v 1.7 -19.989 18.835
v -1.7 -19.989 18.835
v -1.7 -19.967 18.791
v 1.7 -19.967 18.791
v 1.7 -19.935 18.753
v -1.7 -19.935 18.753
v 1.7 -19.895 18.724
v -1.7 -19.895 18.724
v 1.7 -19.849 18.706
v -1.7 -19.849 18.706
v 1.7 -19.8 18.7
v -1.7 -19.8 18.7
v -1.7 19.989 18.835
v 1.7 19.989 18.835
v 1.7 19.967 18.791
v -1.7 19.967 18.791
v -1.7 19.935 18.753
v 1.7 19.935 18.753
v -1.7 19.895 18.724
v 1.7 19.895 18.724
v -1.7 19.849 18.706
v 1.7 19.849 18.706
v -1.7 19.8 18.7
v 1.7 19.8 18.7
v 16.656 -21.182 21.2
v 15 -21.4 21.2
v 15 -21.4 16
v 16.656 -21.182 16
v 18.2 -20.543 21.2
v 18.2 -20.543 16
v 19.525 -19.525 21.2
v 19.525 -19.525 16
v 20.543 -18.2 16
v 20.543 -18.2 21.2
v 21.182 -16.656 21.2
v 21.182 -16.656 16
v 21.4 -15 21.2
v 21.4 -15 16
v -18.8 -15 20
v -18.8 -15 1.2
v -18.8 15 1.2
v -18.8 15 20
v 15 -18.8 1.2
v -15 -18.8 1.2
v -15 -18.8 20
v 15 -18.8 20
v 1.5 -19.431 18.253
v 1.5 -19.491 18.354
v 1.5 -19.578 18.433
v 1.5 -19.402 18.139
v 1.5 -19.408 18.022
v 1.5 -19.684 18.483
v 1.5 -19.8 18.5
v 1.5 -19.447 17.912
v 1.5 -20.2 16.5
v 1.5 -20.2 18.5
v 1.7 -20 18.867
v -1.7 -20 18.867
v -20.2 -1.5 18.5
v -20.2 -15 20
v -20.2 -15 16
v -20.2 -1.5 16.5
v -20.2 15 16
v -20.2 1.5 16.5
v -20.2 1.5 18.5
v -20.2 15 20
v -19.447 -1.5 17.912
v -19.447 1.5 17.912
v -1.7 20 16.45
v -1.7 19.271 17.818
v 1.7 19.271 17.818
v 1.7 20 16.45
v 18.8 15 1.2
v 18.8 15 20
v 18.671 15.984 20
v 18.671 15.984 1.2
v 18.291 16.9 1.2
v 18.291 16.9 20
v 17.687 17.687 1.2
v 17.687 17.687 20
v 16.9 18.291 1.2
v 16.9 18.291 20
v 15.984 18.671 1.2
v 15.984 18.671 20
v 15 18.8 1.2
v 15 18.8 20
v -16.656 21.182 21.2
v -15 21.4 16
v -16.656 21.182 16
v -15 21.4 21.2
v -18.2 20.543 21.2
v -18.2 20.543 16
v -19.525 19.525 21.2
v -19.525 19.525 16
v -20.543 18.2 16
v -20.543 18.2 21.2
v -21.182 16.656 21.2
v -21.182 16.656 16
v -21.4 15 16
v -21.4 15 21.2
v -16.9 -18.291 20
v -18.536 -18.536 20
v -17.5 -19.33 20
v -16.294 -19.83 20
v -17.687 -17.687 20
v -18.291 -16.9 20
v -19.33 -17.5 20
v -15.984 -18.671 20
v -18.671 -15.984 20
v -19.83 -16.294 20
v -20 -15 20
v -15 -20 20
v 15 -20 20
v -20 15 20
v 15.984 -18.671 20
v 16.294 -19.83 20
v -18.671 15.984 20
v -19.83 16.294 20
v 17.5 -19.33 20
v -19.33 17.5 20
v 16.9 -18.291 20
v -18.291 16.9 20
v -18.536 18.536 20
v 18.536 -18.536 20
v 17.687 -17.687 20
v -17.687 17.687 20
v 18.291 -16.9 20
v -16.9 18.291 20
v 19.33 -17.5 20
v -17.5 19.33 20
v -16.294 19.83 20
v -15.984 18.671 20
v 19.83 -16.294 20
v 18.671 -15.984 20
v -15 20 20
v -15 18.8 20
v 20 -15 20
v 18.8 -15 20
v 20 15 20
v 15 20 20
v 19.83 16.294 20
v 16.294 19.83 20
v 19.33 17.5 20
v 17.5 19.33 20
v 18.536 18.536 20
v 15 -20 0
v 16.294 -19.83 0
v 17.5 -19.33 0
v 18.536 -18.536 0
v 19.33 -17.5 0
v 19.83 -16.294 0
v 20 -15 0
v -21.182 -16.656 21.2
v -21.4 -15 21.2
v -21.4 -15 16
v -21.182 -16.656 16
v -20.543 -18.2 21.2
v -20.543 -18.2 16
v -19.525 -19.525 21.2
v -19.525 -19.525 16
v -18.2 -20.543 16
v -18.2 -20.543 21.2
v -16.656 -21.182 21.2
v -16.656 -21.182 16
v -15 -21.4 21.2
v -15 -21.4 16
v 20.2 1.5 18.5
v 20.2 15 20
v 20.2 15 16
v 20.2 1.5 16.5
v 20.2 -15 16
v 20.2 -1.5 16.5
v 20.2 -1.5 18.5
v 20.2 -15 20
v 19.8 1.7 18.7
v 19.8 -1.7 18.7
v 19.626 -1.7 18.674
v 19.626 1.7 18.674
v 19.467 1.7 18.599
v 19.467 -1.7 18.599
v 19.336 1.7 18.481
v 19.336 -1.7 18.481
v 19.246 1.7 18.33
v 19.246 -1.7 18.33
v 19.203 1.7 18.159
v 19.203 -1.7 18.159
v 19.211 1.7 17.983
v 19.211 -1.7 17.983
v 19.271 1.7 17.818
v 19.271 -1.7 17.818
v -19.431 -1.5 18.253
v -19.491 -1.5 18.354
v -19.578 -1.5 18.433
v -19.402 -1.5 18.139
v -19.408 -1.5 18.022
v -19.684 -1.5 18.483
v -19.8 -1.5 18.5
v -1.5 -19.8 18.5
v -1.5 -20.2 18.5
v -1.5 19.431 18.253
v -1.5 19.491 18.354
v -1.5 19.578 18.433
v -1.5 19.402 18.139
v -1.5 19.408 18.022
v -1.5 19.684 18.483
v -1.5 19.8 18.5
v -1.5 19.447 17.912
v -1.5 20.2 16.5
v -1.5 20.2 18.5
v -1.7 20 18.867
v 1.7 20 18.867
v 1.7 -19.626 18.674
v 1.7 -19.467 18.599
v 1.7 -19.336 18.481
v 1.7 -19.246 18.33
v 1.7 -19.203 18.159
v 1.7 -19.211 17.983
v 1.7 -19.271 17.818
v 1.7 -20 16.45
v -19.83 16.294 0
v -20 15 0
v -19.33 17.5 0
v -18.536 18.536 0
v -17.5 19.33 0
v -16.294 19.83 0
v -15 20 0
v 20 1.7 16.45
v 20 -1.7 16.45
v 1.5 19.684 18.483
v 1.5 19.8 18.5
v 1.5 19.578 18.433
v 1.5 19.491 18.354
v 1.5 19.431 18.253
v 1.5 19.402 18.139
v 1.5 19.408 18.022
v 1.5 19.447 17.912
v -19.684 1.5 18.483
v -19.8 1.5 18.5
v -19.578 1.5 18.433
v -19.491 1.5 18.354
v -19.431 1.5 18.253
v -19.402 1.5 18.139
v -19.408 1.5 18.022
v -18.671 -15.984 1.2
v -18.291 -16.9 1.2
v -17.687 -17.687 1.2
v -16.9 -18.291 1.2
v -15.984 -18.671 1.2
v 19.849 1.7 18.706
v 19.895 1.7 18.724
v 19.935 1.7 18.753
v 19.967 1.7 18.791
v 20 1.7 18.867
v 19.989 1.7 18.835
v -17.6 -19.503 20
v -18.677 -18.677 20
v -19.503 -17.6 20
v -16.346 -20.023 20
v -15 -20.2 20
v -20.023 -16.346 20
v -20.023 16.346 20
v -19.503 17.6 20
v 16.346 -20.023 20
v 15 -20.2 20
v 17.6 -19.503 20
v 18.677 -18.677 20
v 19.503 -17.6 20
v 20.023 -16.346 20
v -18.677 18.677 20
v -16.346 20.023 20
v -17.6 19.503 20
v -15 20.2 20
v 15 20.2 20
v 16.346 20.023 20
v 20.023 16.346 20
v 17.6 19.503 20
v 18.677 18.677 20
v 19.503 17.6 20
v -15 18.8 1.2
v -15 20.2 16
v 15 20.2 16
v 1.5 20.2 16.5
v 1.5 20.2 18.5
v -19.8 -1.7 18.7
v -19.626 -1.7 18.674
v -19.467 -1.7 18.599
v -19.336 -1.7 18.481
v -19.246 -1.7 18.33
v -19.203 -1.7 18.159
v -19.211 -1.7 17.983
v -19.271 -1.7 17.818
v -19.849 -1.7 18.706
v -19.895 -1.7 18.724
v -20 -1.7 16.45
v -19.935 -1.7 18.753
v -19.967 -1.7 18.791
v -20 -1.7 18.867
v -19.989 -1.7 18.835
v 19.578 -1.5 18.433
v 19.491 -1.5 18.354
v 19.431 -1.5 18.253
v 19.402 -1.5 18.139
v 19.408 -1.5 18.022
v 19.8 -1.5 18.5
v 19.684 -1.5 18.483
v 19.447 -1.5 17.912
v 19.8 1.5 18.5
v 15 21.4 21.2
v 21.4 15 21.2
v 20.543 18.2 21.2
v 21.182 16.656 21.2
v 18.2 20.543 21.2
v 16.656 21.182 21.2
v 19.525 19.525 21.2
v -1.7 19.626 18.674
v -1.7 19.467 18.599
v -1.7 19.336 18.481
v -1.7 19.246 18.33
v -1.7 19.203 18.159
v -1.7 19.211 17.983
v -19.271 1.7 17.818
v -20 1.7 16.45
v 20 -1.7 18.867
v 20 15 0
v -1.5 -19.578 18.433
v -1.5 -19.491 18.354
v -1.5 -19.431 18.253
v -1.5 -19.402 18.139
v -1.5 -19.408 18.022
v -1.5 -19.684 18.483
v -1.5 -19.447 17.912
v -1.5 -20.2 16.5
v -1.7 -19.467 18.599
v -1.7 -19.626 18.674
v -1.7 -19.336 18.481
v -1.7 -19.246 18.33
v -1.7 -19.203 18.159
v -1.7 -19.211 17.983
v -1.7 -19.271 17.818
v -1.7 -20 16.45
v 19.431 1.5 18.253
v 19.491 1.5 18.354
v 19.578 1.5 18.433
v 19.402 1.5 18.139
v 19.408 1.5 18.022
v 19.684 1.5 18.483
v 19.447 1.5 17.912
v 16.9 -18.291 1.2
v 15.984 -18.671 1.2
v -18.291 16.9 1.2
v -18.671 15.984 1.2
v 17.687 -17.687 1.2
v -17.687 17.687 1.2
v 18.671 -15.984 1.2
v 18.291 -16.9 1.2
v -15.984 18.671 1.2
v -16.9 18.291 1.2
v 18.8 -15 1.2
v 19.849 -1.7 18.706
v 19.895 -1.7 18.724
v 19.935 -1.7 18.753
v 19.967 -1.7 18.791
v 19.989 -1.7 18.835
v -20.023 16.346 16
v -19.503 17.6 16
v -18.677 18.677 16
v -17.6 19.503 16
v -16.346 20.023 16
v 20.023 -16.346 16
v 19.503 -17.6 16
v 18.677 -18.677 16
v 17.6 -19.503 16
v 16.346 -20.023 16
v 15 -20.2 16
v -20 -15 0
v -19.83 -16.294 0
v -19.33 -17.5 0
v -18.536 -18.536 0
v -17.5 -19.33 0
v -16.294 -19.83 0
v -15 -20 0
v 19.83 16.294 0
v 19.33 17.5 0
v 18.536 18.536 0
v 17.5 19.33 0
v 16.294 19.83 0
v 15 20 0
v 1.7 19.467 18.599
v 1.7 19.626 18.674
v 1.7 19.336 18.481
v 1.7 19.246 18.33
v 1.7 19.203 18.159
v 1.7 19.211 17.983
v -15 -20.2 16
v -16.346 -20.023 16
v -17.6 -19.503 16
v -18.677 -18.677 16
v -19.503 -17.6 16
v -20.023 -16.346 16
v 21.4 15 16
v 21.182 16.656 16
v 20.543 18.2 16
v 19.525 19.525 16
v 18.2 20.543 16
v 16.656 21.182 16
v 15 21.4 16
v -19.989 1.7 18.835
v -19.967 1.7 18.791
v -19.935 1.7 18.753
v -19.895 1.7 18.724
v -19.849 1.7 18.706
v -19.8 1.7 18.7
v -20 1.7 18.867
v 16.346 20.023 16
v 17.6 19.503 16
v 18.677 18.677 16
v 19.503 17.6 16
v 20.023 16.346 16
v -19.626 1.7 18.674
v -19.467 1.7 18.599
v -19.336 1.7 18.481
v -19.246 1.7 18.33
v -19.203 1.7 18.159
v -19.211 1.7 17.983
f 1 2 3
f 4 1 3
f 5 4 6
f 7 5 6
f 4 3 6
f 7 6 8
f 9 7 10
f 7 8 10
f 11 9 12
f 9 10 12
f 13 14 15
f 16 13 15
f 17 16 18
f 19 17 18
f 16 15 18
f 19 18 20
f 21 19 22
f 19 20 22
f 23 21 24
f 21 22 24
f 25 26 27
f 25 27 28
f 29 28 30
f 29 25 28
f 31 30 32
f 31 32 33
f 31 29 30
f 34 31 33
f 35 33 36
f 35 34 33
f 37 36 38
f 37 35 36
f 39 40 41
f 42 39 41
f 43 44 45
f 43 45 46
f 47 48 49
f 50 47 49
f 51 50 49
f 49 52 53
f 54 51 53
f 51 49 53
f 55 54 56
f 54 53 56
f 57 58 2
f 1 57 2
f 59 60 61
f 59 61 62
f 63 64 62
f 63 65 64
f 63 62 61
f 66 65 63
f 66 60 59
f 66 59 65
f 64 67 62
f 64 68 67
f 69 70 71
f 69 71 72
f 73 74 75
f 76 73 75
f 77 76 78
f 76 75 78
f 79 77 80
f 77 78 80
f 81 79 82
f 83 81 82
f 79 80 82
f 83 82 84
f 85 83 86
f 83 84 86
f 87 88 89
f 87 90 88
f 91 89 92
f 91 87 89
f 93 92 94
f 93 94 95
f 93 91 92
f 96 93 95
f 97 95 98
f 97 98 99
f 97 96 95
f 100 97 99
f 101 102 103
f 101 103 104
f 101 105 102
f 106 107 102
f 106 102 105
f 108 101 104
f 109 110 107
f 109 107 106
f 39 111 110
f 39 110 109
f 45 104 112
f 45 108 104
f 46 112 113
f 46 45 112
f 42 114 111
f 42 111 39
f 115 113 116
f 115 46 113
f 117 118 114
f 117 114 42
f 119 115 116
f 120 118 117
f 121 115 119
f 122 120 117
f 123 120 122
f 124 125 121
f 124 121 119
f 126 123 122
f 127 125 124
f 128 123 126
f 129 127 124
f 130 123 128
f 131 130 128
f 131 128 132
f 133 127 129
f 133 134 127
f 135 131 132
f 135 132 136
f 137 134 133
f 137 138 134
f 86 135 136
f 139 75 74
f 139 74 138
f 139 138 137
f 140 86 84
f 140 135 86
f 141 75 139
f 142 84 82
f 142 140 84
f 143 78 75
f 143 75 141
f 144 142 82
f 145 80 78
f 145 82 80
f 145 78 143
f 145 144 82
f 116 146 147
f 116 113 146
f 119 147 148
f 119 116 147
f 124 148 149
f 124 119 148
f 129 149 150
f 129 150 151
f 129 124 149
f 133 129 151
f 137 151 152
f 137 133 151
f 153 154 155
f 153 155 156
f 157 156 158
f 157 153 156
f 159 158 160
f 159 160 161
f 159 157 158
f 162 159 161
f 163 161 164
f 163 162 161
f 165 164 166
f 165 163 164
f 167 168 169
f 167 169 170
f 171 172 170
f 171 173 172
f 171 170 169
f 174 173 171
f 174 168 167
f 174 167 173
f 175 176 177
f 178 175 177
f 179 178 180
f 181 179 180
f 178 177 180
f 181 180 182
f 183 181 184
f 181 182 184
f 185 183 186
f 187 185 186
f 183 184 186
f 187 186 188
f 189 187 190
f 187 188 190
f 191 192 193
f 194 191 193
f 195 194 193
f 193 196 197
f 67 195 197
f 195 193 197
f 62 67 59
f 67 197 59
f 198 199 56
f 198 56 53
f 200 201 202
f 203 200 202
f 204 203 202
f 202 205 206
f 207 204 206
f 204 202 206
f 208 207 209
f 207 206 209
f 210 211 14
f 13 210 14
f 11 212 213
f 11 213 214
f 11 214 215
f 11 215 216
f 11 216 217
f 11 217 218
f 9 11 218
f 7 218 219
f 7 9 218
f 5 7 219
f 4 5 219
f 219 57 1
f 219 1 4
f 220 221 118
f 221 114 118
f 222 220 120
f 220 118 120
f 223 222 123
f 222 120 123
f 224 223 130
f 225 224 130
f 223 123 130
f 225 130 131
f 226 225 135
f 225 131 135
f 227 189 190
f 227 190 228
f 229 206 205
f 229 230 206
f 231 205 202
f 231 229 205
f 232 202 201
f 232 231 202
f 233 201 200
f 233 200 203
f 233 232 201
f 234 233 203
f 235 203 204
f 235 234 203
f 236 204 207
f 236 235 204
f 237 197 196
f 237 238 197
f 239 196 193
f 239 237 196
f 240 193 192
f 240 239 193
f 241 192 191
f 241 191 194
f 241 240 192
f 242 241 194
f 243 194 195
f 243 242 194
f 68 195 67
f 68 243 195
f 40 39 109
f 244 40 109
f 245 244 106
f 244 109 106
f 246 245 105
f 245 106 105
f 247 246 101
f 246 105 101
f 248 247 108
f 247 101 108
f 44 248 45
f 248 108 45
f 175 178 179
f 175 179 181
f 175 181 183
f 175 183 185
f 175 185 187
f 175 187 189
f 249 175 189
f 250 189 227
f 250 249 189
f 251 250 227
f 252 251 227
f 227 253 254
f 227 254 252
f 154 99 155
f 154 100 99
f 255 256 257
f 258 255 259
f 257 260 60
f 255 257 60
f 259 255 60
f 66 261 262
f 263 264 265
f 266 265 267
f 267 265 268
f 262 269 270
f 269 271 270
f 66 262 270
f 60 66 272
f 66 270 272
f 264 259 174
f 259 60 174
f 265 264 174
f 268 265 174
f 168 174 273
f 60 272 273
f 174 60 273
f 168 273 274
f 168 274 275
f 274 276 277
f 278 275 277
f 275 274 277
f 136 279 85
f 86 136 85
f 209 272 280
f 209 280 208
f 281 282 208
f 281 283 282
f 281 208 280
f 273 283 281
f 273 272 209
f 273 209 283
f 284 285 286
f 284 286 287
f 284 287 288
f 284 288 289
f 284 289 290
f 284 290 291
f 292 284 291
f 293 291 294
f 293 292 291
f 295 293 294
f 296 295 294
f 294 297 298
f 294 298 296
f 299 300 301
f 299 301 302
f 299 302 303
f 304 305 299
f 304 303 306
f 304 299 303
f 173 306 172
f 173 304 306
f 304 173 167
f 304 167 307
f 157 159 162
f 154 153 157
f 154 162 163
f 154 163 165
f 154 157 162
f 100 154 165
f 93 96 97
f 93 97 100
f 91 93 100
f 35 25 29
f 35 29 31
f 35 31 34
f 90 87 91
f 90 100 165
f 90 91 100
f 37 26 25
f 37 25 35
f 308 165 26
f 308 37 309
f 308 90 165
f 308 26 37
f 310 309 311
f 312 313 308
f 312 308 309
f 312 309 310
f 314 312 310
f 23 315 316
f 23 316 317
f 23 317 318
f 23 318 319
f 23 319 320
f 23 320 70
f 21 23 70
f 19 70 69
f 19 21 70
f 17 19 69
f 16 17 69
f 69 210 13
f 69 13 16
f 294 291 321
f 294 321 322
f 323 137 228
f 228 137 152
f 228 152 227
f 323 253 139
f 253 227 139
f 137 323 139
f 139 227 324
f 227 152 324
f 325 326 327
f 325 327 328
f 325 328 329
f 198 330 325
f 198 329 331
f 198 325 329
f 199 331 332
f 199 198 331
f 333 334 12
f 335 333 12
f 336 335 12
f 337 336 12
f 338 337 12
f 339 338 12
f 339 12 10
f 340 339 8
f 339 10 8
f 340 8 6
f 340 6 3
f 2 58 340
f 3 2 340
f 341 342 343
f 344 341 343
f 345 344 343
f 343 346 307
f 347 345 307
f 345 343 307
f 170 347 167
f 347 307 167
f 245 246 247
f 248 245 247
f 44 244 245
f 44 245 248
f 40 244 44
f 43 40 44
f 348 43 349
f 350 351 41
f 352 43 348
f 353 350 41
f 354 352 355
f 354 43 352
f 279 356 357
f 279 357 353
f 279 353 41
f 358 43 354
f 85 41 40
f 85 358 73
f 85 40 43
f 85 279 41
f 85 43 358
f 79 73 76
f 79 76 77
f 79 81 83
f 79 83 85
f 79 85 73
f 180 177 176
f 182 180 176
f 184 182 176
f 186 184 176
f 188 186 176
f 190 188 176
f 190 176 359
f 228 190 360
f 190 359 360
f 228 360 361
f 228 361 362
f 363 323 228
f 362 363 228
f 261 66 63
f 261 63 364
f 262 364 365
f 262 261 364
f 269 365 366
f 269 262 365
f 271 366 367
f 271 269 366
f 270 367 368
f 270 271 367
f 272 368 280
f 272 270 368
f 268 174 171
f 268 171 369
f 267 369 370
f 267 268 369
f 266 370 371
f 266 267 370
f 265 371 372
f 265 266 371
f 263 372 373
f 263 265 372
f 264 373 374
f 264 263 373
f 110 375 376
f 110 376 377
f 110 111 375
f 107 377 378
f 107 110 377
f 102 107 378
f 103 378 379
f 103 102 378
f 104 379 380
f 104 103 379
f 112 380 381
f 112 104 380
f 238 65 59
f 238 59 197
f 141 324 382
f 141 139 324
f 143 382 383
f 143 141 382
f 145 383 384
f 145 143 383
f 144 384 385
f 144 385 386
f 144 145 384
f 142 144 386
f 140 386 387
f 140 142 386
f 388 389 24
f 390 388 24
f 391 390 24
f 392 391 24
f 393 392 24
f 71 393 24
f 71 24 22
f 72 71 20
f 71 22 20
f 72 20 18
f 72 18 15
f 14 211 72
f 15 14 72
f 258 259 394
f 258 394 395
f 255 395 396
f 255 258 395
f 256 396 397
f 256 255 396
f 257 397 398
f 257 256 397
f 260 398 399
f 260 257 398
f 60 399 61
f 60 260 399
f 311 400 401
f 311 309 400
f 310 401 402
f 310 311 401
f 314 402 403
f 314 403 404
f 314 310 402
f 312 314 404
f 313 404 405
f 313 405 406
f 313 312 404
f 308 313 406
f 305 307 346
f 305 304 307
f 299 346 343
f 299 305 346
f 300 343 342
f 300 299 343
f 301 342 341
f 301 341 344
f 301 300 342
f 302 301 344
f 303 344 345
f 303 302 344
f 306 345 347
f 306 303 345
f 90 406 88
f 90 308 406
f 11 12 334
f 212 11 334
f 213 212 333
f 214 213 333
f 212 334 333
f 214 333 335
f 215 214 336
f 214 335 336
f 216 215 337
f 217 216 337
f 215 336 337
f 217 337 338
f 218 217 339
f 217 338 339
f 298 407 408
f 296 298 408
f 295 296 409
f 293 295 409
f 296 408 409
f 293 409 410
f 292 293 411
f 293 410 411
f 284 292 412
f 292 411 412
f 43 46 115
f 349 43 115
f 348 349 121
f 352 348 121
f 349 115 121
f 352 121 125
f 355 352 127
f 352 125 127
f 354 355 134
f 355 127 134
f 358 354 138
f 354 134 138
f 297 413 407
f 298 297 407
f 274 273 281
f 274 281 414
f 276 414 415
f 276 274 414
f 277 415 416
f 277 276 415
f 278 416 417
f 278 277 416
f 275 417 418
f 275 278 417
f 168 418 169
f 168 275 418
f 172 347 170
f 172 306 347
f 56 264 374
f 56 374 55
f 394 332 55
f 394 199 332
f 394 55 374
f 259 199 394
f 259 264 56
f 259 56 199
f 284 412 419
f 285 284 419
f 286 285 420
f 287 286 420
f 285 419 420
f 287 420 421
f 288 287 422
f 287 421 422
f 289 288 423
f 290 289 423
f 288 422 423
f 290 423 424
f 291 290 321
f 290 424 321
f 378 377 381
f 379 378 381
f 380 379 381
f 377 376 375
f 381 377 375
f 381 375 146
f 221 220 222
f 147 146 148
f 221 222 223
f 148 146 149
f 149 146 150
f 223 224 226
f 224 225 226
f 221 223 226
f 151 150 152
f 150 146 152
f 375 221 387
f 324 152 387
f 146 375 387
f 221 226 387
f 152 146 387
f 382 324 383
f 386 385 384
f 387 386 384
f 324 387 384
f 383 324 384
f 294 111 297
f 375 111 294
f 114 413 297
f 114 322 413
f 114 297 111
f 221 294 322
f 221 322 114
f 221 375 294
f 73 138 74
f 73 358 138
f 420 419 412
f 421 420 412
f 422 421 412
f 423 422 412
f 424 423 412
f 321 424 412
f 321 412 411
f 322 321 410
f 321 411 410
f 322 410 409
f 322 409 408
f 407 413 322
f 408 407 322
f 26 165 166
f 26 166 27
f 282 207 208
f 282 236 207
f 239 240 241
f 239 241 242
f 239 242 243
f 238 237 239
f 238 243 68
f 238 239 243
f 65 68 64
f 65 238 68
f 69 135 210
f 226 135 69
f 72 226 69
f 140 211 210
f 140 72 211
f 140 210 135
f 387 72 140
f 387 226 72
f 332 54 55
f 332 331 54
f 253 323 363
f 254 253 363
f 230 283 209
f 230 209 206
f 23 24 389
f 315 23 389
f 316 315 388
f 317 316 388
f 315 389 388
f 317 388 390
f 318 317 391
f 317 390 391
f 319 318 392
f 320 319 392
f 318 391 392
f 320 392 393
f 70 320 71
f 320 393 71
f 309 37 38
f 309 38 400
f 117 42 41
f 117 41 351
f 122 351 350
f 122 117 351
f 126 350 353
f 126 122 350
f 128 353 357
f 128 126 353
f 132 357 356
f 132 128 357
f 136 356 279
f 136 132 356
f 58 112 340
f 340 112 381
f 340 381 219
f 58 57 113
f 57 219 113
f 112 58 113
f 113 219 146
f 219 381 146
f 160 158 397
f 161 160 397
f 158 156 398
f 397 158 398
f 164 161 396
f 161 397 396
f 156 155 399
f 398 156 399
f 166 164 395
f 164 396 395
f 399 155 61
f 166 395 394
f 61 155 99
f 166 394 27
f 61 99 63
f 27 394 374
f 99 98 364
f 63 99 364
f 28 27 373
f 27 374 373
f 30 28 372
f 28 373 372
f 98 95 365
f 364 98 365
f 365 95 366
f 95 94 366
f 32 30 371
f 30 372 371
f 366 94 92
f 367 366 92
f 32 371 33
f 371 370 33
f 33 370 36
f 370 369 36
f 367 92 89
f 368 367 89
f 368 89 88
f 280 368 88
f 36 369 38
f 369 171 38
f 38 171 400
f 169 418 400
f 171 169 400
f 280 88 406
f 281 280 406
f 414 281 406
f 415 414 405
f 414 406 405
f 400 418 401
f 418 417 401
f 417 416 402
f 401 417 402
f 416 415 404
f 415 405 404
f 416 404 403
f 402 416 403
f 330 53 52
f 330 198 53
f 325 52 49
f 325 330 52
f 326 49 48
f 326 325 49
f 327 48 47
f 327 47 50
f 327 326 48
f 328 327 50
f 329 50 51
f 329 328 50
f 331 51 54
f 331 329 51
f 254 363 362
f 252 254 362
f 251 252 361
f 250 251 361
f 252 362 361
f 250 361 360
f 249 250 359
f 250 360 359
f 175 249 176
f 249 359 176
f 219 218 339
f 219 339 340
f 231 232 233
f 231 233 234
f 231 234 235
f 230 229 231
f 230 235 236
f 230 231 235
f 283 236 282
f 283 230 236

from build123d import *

# Parameters (mm, degrees)
F0_W            = 40
F0_H            = 40
F1_DEPTH        = 20
F2_R            = 5
F3_T            = -1.2
F5_DEPTH        = 1.2
F6_DEPTH        = 4
F8_DEPTH        = 1.7
F8_COPIES_COUNT = 4
F9_DEPTH        = 1.5
F9_COPIES_COUNT = 4


# Not quite as in the source:
# - a pattern or mirror of a feature is missing from the dataset's text; its kind, count and spacing are read off the source's solid


with BuildPart() as f1:
    # F0 (on Top) → F1 (new body)
    with BuildSketch(Plane.XY):
        Rectangle(F0_W, F0_H)
    extrude(amount=F1_DEPTH)

    # F2
    f2_edges = [f1.edges().sort_by_distance(p)[0] for p in [
        (20, -20, 10),
        (20, 20, 10),
        (-20, -20, 10),
        (-20, 20, 10),
    ]]
    fillet(f2_edges, radius=F2_R)

    # F3
    f3_openings = [f1.faces().sort_by_distance(p)[0] for p in [
        (0, 0, 20),
    ]]
    offset(amount=F3_T, openings=f3_openings)

    # F7 (on Front) → F8 (cut, symmetric)
    with BuildSketch(Plane.XZ):
        with BuildLine():
            Line((19.4470588235, 17.9117647059), (20.2, 16.5))
            Line((20.2, 16.5), (20.2, 18.5))
            Line((20.2, 18.5), (19.8, 18.5))
            ThreePointArc((19.8, 18.5), (19.4570028297, 18.3057983022), (19.4470588235, 17.9117647059))
        make_face()
        with BuildLine():
            Line((19.8, 18.5), (20.2, 18.5))
            Line((20.2, 18.5), (20.2, 18.9))
            ThreePointArc((20.2, 18.9), (20.0828427125, 18.6171572875), (19.8, 18.5))
        make_face()
        with BuildLine():
            Line((20.2, 16.0750016282), (20.2, 16.5))
            Line((20.2, 16.5), (19.4470588235, 17.9117647059))
            ThreePointArc((19.4470588235, 17.9117647059), (19.4570028297, 18.3057983022), (19.8, 18.5))
            ThreePointArc((19.8, 18.5), (20.0828427125, 18.6171572875), (20.2, 18.9))
            Line((20.2, 18.9), (20.2, 19.45))
            Line((20.2, 19.45), (19.9891899905, 18.8351351096))
            ThreePointArc((19.9891899905, 18.8351351096), (19.91624818, 18.7372527508), (19.8, 18.6999992338))
            ThreePointArc((19.8, 18.6999992338), (19.2855049016, 18.408697059), (19.2705889114, 17.8176474194))
            Line((19.2705889114, 17.8176474194), (20.2, 16.0750016282))
        make_face()
    f8 = extrude(amount=F8_DEPTH, both=True, mode=Mode.SUBTRACT)

    # F8_copies: F8 ×4 about axis
    f8_copies_axis = Axis((0, 0, 0), (0, 0, 1))
    for i in range(1, F8_COPIES_COUNT):
        add(f8.rotate(f8_copies_axis, i * 360 / F8_COPIES_COUNT), mode=Mode.SUBTRACT)


with BuildPart() as f5:
    # F4 (on face) → F5 (new body)
    with BuildSketch(Plane.XY.offset(20)):
        with BuildLine():
            Line((-21.4, 15), (-21.4, -15))
            ThreePointArc((-21.4, -15), (-19.5254833996, -19.5254833996), (-15, -21.4))
            Line((-15, -21.4), (15, -21.4))
            ThreePointArc((15, -21.4), (19.5254833996, -19.5254833996), (21.4, -15))
            Line((21.4, -15), (21.4, 15))
            ThreePointArc((21.4, 15), (19.5254833996, 19.5254833996), (15, 21.4))
            Line((15, 21.4), (-15, 21.4))
            ThreePointArc((-15, 21.4), (-19.5254833996, 19.5254833996), (-21.4, 15))
        make_face()
        with BuildLine():
            ThreePointArc((-15, -20.2), (-18.6769552622, -18.6769552622), (-20.2, -15))
            Line((-20.2, -15), (-20.2, 15))
            ThreePointArc((-20.2, 15), (-18.6769552622, 18.6769552622), (-15, 20.2))
            Line((-15, 20.2), (15, 20.2))
            ThreePointArc((15, 20.2), (18.6769552622, 18.6769552622), (20.2, 15))
            Line((20.2, 15), (20.2, -15))
            ThreePointArc((20.2, -15), (18.6769552622, -18.6769552622), (15, -20.2))
            Line((15, -20.2), (-15, -20.2))
        make_face(mode=Mode.SUBTRACT)
        with BuildLine():
            Line((-20.2, 15), (-20.2, -15))
            ThreePointArc((-20.2, -15), (-18.6769552622, -18.6769552622), (-15, -20.2))
            Line((-15, -20.2), (15, -20.2))
            ThreePointArc((15, -20.2), (18.6769552622, -18.6769552622), (20.2, -15))
            Line((20.2, -15), (20.2, 15))
            ThreePointArc((20.2, 15), (18.6769552622, 18.6769552622), (15, 20.2))
            Line((15, 20.2), (-15, 20.2))
            ThreePointArc((-15, 20.2), (-18.6769552622, 18.6769552622), (-20.2, 15))
        make_face()
        with BuildLine():
            Line((15, -20), (-15, -20))
            ThreePointArc((-15, -20), (-18.5355339059, -18.5355339059), (-20, -15))
            Line((-20, -15), (-20, 15))
            ThreePointArc((-20, 15), (-18.5355339059, 18.5355339059), (-15, 20))
            Line((-15, 20), (15, 20))
            ThreePointArc((15, 20), (18.5355339059, 18.5355339059), (20, 15))
            Line((20, 15), (20, -15))
            ThreePointArc((20, -15), (18.5355339059, -18.5355339059), (15, -20))
        make_face(mode=Mode.SUBTRACT)
        with BuildLine():
            ThreePointArc((-20, -15), (-18.5355339059, -18.5355339059), (-15, -20))
            Line((-15, -20), (15, -20))
            ThreePointArc((15, -20), (18.5355339059, -18.5355339059), (20, -15))
            Line((20, -15), (20, 15))
            ThreePointArc((20, 15), (18.5355339059, 18.5355339059), (15, 20))
            Line((15, 20), (-15, 20))
            ThreePointArc((-15, 20), (-18.5355339059, 18.5355339059), (-20, 15))
            Line((-20, 15), (-20, -15))
        make_face()
        with BuildLine():
            ThreePointArc((-18.8, 15), (-17.6870057685, 17.6870057685), (-15, 18.8))
            Line((-15, 18.8), (15, 18.8))
            ThreePointArc((15, 18.8), (17.6870057685, 17.6870057685), (18.8, 15))
            Line((18.8, 15), (18.8, -15))
            ThreePointArc((18.8, -15), (17.6870057685, -17.6870057685), (15, -18.8))
            Line((15, -18.8), (-15, -18.8))
            ThreePointArc((-15, -18.8), (-17.6870057685, -17.6870057685), (-18.8, -15))
            Line((-18.8, -15), (-18.8, 15))
        make_face(mode=Mode.SUBTRACT)
        with BuildLine():
            Line((15, 18.8), (-15, 18.8))
            ThreePointArc((-15, 18.8), (-17.6870057685, 17.6870057685), (-18.8, 15))
            Line((-18.8, 15), (-18.8, -15))
            ThreePointArc((-18.8, -15), (-17.6870057685, -17.6870057685), (-15, -18.8))
            Line((-15, -18.8), (15, -18.8))
            ThreePointArc((15, -18.8), (17.6870057685, -17.6870057685), (18.8, -15))
            Line((18.8, -15), (18.8, 15))
            ThreePointArc((18.8, 15), (17.6870057685, 17.6870057685), (15, 18.8))
        make_face()
    extrude(amount=F5_DEPTH)

    # F4 (on face) → F6 (join)
    with BuildSketch(Plane.XY.offset(20)):
        with BuildLine():
            Line((-21.4, 15), (-21.4, -15))
            ThreePointArc((-21.4, -15), (-19.5254833996, -19.5254833996), (-15, -21.4))
            Line((-15, -21.4), (15, -21.4))
            ThreePointArc((15, -21.4), (19.5254833996, -19.5254833996), (21.4, -15))
            Line((21.4, -15), (21.4, 15))
            ThreePointArc((21.4, 15), (19.5254833996, 19.5254833996), (15, 21.4))
            Line((15, 21.4), (-15, 21.4))
            ThreePointArc((-15, 21.4), (-19.5254833996, 19.5254833996), (-21.4, 15))
        make_face()
        with BuildLine():
            ThreePointArc((-15, -20.2), (-18.6769552622, -18.6769552622), (-20.2, -15))
            Line((-20.2, -15), (-20.2, 15))
            ThreePointArc((-20.2, 15), (-18.6769552622, 18.6769552622), (-15, 20.2))
            Line((-15, 20.2), (15, 20.2))
            ThreePointArc((15, 20.2), (18.6769552622, 18.6769552622), (20.2, 15))
            Line((20.2, 15), (20.2, -15))
            ThreePointArc((20.2, -15), (18.6769552622, -18.6769552622), (15, -20.2))
            Line((15, -20.2), (-15, -20.2))
        make_face(mode=Mode.SUBTRACT)
    extrude(amount=-F6_DEPTH)

    # F7 (on Front) → F9 (join, symmetric)
    with BuildSketch(Plane.XZ):
        with BuildLine():
            Line((19.4470588235, 17.9117647059), (20.2, 16.5))
            Line((20.2, 16.5), (20.2, 18.5))
            Line((20.2, 18.5), (19.8, 18.5))
            ThreePointArc((19.8, 18.5), (19.4570028297, 18.3057983022), (19.4470588235, 17.9117647059))
        make_face()
    f9 = extrude(amount=F9_DEPTH, both=True)

    # F9_copies: F9 ×4 about axis
    f9_copies_axis = Axis((0, 0, 0), (0, 0, 1))
    for i in range(1, F9_COPIES_COUNT):
        add(f9.rotate(f9_copies_axis, i * 360 / F9_COPIES_COUNT))


solid = Compound([f1.part, f5.part])
